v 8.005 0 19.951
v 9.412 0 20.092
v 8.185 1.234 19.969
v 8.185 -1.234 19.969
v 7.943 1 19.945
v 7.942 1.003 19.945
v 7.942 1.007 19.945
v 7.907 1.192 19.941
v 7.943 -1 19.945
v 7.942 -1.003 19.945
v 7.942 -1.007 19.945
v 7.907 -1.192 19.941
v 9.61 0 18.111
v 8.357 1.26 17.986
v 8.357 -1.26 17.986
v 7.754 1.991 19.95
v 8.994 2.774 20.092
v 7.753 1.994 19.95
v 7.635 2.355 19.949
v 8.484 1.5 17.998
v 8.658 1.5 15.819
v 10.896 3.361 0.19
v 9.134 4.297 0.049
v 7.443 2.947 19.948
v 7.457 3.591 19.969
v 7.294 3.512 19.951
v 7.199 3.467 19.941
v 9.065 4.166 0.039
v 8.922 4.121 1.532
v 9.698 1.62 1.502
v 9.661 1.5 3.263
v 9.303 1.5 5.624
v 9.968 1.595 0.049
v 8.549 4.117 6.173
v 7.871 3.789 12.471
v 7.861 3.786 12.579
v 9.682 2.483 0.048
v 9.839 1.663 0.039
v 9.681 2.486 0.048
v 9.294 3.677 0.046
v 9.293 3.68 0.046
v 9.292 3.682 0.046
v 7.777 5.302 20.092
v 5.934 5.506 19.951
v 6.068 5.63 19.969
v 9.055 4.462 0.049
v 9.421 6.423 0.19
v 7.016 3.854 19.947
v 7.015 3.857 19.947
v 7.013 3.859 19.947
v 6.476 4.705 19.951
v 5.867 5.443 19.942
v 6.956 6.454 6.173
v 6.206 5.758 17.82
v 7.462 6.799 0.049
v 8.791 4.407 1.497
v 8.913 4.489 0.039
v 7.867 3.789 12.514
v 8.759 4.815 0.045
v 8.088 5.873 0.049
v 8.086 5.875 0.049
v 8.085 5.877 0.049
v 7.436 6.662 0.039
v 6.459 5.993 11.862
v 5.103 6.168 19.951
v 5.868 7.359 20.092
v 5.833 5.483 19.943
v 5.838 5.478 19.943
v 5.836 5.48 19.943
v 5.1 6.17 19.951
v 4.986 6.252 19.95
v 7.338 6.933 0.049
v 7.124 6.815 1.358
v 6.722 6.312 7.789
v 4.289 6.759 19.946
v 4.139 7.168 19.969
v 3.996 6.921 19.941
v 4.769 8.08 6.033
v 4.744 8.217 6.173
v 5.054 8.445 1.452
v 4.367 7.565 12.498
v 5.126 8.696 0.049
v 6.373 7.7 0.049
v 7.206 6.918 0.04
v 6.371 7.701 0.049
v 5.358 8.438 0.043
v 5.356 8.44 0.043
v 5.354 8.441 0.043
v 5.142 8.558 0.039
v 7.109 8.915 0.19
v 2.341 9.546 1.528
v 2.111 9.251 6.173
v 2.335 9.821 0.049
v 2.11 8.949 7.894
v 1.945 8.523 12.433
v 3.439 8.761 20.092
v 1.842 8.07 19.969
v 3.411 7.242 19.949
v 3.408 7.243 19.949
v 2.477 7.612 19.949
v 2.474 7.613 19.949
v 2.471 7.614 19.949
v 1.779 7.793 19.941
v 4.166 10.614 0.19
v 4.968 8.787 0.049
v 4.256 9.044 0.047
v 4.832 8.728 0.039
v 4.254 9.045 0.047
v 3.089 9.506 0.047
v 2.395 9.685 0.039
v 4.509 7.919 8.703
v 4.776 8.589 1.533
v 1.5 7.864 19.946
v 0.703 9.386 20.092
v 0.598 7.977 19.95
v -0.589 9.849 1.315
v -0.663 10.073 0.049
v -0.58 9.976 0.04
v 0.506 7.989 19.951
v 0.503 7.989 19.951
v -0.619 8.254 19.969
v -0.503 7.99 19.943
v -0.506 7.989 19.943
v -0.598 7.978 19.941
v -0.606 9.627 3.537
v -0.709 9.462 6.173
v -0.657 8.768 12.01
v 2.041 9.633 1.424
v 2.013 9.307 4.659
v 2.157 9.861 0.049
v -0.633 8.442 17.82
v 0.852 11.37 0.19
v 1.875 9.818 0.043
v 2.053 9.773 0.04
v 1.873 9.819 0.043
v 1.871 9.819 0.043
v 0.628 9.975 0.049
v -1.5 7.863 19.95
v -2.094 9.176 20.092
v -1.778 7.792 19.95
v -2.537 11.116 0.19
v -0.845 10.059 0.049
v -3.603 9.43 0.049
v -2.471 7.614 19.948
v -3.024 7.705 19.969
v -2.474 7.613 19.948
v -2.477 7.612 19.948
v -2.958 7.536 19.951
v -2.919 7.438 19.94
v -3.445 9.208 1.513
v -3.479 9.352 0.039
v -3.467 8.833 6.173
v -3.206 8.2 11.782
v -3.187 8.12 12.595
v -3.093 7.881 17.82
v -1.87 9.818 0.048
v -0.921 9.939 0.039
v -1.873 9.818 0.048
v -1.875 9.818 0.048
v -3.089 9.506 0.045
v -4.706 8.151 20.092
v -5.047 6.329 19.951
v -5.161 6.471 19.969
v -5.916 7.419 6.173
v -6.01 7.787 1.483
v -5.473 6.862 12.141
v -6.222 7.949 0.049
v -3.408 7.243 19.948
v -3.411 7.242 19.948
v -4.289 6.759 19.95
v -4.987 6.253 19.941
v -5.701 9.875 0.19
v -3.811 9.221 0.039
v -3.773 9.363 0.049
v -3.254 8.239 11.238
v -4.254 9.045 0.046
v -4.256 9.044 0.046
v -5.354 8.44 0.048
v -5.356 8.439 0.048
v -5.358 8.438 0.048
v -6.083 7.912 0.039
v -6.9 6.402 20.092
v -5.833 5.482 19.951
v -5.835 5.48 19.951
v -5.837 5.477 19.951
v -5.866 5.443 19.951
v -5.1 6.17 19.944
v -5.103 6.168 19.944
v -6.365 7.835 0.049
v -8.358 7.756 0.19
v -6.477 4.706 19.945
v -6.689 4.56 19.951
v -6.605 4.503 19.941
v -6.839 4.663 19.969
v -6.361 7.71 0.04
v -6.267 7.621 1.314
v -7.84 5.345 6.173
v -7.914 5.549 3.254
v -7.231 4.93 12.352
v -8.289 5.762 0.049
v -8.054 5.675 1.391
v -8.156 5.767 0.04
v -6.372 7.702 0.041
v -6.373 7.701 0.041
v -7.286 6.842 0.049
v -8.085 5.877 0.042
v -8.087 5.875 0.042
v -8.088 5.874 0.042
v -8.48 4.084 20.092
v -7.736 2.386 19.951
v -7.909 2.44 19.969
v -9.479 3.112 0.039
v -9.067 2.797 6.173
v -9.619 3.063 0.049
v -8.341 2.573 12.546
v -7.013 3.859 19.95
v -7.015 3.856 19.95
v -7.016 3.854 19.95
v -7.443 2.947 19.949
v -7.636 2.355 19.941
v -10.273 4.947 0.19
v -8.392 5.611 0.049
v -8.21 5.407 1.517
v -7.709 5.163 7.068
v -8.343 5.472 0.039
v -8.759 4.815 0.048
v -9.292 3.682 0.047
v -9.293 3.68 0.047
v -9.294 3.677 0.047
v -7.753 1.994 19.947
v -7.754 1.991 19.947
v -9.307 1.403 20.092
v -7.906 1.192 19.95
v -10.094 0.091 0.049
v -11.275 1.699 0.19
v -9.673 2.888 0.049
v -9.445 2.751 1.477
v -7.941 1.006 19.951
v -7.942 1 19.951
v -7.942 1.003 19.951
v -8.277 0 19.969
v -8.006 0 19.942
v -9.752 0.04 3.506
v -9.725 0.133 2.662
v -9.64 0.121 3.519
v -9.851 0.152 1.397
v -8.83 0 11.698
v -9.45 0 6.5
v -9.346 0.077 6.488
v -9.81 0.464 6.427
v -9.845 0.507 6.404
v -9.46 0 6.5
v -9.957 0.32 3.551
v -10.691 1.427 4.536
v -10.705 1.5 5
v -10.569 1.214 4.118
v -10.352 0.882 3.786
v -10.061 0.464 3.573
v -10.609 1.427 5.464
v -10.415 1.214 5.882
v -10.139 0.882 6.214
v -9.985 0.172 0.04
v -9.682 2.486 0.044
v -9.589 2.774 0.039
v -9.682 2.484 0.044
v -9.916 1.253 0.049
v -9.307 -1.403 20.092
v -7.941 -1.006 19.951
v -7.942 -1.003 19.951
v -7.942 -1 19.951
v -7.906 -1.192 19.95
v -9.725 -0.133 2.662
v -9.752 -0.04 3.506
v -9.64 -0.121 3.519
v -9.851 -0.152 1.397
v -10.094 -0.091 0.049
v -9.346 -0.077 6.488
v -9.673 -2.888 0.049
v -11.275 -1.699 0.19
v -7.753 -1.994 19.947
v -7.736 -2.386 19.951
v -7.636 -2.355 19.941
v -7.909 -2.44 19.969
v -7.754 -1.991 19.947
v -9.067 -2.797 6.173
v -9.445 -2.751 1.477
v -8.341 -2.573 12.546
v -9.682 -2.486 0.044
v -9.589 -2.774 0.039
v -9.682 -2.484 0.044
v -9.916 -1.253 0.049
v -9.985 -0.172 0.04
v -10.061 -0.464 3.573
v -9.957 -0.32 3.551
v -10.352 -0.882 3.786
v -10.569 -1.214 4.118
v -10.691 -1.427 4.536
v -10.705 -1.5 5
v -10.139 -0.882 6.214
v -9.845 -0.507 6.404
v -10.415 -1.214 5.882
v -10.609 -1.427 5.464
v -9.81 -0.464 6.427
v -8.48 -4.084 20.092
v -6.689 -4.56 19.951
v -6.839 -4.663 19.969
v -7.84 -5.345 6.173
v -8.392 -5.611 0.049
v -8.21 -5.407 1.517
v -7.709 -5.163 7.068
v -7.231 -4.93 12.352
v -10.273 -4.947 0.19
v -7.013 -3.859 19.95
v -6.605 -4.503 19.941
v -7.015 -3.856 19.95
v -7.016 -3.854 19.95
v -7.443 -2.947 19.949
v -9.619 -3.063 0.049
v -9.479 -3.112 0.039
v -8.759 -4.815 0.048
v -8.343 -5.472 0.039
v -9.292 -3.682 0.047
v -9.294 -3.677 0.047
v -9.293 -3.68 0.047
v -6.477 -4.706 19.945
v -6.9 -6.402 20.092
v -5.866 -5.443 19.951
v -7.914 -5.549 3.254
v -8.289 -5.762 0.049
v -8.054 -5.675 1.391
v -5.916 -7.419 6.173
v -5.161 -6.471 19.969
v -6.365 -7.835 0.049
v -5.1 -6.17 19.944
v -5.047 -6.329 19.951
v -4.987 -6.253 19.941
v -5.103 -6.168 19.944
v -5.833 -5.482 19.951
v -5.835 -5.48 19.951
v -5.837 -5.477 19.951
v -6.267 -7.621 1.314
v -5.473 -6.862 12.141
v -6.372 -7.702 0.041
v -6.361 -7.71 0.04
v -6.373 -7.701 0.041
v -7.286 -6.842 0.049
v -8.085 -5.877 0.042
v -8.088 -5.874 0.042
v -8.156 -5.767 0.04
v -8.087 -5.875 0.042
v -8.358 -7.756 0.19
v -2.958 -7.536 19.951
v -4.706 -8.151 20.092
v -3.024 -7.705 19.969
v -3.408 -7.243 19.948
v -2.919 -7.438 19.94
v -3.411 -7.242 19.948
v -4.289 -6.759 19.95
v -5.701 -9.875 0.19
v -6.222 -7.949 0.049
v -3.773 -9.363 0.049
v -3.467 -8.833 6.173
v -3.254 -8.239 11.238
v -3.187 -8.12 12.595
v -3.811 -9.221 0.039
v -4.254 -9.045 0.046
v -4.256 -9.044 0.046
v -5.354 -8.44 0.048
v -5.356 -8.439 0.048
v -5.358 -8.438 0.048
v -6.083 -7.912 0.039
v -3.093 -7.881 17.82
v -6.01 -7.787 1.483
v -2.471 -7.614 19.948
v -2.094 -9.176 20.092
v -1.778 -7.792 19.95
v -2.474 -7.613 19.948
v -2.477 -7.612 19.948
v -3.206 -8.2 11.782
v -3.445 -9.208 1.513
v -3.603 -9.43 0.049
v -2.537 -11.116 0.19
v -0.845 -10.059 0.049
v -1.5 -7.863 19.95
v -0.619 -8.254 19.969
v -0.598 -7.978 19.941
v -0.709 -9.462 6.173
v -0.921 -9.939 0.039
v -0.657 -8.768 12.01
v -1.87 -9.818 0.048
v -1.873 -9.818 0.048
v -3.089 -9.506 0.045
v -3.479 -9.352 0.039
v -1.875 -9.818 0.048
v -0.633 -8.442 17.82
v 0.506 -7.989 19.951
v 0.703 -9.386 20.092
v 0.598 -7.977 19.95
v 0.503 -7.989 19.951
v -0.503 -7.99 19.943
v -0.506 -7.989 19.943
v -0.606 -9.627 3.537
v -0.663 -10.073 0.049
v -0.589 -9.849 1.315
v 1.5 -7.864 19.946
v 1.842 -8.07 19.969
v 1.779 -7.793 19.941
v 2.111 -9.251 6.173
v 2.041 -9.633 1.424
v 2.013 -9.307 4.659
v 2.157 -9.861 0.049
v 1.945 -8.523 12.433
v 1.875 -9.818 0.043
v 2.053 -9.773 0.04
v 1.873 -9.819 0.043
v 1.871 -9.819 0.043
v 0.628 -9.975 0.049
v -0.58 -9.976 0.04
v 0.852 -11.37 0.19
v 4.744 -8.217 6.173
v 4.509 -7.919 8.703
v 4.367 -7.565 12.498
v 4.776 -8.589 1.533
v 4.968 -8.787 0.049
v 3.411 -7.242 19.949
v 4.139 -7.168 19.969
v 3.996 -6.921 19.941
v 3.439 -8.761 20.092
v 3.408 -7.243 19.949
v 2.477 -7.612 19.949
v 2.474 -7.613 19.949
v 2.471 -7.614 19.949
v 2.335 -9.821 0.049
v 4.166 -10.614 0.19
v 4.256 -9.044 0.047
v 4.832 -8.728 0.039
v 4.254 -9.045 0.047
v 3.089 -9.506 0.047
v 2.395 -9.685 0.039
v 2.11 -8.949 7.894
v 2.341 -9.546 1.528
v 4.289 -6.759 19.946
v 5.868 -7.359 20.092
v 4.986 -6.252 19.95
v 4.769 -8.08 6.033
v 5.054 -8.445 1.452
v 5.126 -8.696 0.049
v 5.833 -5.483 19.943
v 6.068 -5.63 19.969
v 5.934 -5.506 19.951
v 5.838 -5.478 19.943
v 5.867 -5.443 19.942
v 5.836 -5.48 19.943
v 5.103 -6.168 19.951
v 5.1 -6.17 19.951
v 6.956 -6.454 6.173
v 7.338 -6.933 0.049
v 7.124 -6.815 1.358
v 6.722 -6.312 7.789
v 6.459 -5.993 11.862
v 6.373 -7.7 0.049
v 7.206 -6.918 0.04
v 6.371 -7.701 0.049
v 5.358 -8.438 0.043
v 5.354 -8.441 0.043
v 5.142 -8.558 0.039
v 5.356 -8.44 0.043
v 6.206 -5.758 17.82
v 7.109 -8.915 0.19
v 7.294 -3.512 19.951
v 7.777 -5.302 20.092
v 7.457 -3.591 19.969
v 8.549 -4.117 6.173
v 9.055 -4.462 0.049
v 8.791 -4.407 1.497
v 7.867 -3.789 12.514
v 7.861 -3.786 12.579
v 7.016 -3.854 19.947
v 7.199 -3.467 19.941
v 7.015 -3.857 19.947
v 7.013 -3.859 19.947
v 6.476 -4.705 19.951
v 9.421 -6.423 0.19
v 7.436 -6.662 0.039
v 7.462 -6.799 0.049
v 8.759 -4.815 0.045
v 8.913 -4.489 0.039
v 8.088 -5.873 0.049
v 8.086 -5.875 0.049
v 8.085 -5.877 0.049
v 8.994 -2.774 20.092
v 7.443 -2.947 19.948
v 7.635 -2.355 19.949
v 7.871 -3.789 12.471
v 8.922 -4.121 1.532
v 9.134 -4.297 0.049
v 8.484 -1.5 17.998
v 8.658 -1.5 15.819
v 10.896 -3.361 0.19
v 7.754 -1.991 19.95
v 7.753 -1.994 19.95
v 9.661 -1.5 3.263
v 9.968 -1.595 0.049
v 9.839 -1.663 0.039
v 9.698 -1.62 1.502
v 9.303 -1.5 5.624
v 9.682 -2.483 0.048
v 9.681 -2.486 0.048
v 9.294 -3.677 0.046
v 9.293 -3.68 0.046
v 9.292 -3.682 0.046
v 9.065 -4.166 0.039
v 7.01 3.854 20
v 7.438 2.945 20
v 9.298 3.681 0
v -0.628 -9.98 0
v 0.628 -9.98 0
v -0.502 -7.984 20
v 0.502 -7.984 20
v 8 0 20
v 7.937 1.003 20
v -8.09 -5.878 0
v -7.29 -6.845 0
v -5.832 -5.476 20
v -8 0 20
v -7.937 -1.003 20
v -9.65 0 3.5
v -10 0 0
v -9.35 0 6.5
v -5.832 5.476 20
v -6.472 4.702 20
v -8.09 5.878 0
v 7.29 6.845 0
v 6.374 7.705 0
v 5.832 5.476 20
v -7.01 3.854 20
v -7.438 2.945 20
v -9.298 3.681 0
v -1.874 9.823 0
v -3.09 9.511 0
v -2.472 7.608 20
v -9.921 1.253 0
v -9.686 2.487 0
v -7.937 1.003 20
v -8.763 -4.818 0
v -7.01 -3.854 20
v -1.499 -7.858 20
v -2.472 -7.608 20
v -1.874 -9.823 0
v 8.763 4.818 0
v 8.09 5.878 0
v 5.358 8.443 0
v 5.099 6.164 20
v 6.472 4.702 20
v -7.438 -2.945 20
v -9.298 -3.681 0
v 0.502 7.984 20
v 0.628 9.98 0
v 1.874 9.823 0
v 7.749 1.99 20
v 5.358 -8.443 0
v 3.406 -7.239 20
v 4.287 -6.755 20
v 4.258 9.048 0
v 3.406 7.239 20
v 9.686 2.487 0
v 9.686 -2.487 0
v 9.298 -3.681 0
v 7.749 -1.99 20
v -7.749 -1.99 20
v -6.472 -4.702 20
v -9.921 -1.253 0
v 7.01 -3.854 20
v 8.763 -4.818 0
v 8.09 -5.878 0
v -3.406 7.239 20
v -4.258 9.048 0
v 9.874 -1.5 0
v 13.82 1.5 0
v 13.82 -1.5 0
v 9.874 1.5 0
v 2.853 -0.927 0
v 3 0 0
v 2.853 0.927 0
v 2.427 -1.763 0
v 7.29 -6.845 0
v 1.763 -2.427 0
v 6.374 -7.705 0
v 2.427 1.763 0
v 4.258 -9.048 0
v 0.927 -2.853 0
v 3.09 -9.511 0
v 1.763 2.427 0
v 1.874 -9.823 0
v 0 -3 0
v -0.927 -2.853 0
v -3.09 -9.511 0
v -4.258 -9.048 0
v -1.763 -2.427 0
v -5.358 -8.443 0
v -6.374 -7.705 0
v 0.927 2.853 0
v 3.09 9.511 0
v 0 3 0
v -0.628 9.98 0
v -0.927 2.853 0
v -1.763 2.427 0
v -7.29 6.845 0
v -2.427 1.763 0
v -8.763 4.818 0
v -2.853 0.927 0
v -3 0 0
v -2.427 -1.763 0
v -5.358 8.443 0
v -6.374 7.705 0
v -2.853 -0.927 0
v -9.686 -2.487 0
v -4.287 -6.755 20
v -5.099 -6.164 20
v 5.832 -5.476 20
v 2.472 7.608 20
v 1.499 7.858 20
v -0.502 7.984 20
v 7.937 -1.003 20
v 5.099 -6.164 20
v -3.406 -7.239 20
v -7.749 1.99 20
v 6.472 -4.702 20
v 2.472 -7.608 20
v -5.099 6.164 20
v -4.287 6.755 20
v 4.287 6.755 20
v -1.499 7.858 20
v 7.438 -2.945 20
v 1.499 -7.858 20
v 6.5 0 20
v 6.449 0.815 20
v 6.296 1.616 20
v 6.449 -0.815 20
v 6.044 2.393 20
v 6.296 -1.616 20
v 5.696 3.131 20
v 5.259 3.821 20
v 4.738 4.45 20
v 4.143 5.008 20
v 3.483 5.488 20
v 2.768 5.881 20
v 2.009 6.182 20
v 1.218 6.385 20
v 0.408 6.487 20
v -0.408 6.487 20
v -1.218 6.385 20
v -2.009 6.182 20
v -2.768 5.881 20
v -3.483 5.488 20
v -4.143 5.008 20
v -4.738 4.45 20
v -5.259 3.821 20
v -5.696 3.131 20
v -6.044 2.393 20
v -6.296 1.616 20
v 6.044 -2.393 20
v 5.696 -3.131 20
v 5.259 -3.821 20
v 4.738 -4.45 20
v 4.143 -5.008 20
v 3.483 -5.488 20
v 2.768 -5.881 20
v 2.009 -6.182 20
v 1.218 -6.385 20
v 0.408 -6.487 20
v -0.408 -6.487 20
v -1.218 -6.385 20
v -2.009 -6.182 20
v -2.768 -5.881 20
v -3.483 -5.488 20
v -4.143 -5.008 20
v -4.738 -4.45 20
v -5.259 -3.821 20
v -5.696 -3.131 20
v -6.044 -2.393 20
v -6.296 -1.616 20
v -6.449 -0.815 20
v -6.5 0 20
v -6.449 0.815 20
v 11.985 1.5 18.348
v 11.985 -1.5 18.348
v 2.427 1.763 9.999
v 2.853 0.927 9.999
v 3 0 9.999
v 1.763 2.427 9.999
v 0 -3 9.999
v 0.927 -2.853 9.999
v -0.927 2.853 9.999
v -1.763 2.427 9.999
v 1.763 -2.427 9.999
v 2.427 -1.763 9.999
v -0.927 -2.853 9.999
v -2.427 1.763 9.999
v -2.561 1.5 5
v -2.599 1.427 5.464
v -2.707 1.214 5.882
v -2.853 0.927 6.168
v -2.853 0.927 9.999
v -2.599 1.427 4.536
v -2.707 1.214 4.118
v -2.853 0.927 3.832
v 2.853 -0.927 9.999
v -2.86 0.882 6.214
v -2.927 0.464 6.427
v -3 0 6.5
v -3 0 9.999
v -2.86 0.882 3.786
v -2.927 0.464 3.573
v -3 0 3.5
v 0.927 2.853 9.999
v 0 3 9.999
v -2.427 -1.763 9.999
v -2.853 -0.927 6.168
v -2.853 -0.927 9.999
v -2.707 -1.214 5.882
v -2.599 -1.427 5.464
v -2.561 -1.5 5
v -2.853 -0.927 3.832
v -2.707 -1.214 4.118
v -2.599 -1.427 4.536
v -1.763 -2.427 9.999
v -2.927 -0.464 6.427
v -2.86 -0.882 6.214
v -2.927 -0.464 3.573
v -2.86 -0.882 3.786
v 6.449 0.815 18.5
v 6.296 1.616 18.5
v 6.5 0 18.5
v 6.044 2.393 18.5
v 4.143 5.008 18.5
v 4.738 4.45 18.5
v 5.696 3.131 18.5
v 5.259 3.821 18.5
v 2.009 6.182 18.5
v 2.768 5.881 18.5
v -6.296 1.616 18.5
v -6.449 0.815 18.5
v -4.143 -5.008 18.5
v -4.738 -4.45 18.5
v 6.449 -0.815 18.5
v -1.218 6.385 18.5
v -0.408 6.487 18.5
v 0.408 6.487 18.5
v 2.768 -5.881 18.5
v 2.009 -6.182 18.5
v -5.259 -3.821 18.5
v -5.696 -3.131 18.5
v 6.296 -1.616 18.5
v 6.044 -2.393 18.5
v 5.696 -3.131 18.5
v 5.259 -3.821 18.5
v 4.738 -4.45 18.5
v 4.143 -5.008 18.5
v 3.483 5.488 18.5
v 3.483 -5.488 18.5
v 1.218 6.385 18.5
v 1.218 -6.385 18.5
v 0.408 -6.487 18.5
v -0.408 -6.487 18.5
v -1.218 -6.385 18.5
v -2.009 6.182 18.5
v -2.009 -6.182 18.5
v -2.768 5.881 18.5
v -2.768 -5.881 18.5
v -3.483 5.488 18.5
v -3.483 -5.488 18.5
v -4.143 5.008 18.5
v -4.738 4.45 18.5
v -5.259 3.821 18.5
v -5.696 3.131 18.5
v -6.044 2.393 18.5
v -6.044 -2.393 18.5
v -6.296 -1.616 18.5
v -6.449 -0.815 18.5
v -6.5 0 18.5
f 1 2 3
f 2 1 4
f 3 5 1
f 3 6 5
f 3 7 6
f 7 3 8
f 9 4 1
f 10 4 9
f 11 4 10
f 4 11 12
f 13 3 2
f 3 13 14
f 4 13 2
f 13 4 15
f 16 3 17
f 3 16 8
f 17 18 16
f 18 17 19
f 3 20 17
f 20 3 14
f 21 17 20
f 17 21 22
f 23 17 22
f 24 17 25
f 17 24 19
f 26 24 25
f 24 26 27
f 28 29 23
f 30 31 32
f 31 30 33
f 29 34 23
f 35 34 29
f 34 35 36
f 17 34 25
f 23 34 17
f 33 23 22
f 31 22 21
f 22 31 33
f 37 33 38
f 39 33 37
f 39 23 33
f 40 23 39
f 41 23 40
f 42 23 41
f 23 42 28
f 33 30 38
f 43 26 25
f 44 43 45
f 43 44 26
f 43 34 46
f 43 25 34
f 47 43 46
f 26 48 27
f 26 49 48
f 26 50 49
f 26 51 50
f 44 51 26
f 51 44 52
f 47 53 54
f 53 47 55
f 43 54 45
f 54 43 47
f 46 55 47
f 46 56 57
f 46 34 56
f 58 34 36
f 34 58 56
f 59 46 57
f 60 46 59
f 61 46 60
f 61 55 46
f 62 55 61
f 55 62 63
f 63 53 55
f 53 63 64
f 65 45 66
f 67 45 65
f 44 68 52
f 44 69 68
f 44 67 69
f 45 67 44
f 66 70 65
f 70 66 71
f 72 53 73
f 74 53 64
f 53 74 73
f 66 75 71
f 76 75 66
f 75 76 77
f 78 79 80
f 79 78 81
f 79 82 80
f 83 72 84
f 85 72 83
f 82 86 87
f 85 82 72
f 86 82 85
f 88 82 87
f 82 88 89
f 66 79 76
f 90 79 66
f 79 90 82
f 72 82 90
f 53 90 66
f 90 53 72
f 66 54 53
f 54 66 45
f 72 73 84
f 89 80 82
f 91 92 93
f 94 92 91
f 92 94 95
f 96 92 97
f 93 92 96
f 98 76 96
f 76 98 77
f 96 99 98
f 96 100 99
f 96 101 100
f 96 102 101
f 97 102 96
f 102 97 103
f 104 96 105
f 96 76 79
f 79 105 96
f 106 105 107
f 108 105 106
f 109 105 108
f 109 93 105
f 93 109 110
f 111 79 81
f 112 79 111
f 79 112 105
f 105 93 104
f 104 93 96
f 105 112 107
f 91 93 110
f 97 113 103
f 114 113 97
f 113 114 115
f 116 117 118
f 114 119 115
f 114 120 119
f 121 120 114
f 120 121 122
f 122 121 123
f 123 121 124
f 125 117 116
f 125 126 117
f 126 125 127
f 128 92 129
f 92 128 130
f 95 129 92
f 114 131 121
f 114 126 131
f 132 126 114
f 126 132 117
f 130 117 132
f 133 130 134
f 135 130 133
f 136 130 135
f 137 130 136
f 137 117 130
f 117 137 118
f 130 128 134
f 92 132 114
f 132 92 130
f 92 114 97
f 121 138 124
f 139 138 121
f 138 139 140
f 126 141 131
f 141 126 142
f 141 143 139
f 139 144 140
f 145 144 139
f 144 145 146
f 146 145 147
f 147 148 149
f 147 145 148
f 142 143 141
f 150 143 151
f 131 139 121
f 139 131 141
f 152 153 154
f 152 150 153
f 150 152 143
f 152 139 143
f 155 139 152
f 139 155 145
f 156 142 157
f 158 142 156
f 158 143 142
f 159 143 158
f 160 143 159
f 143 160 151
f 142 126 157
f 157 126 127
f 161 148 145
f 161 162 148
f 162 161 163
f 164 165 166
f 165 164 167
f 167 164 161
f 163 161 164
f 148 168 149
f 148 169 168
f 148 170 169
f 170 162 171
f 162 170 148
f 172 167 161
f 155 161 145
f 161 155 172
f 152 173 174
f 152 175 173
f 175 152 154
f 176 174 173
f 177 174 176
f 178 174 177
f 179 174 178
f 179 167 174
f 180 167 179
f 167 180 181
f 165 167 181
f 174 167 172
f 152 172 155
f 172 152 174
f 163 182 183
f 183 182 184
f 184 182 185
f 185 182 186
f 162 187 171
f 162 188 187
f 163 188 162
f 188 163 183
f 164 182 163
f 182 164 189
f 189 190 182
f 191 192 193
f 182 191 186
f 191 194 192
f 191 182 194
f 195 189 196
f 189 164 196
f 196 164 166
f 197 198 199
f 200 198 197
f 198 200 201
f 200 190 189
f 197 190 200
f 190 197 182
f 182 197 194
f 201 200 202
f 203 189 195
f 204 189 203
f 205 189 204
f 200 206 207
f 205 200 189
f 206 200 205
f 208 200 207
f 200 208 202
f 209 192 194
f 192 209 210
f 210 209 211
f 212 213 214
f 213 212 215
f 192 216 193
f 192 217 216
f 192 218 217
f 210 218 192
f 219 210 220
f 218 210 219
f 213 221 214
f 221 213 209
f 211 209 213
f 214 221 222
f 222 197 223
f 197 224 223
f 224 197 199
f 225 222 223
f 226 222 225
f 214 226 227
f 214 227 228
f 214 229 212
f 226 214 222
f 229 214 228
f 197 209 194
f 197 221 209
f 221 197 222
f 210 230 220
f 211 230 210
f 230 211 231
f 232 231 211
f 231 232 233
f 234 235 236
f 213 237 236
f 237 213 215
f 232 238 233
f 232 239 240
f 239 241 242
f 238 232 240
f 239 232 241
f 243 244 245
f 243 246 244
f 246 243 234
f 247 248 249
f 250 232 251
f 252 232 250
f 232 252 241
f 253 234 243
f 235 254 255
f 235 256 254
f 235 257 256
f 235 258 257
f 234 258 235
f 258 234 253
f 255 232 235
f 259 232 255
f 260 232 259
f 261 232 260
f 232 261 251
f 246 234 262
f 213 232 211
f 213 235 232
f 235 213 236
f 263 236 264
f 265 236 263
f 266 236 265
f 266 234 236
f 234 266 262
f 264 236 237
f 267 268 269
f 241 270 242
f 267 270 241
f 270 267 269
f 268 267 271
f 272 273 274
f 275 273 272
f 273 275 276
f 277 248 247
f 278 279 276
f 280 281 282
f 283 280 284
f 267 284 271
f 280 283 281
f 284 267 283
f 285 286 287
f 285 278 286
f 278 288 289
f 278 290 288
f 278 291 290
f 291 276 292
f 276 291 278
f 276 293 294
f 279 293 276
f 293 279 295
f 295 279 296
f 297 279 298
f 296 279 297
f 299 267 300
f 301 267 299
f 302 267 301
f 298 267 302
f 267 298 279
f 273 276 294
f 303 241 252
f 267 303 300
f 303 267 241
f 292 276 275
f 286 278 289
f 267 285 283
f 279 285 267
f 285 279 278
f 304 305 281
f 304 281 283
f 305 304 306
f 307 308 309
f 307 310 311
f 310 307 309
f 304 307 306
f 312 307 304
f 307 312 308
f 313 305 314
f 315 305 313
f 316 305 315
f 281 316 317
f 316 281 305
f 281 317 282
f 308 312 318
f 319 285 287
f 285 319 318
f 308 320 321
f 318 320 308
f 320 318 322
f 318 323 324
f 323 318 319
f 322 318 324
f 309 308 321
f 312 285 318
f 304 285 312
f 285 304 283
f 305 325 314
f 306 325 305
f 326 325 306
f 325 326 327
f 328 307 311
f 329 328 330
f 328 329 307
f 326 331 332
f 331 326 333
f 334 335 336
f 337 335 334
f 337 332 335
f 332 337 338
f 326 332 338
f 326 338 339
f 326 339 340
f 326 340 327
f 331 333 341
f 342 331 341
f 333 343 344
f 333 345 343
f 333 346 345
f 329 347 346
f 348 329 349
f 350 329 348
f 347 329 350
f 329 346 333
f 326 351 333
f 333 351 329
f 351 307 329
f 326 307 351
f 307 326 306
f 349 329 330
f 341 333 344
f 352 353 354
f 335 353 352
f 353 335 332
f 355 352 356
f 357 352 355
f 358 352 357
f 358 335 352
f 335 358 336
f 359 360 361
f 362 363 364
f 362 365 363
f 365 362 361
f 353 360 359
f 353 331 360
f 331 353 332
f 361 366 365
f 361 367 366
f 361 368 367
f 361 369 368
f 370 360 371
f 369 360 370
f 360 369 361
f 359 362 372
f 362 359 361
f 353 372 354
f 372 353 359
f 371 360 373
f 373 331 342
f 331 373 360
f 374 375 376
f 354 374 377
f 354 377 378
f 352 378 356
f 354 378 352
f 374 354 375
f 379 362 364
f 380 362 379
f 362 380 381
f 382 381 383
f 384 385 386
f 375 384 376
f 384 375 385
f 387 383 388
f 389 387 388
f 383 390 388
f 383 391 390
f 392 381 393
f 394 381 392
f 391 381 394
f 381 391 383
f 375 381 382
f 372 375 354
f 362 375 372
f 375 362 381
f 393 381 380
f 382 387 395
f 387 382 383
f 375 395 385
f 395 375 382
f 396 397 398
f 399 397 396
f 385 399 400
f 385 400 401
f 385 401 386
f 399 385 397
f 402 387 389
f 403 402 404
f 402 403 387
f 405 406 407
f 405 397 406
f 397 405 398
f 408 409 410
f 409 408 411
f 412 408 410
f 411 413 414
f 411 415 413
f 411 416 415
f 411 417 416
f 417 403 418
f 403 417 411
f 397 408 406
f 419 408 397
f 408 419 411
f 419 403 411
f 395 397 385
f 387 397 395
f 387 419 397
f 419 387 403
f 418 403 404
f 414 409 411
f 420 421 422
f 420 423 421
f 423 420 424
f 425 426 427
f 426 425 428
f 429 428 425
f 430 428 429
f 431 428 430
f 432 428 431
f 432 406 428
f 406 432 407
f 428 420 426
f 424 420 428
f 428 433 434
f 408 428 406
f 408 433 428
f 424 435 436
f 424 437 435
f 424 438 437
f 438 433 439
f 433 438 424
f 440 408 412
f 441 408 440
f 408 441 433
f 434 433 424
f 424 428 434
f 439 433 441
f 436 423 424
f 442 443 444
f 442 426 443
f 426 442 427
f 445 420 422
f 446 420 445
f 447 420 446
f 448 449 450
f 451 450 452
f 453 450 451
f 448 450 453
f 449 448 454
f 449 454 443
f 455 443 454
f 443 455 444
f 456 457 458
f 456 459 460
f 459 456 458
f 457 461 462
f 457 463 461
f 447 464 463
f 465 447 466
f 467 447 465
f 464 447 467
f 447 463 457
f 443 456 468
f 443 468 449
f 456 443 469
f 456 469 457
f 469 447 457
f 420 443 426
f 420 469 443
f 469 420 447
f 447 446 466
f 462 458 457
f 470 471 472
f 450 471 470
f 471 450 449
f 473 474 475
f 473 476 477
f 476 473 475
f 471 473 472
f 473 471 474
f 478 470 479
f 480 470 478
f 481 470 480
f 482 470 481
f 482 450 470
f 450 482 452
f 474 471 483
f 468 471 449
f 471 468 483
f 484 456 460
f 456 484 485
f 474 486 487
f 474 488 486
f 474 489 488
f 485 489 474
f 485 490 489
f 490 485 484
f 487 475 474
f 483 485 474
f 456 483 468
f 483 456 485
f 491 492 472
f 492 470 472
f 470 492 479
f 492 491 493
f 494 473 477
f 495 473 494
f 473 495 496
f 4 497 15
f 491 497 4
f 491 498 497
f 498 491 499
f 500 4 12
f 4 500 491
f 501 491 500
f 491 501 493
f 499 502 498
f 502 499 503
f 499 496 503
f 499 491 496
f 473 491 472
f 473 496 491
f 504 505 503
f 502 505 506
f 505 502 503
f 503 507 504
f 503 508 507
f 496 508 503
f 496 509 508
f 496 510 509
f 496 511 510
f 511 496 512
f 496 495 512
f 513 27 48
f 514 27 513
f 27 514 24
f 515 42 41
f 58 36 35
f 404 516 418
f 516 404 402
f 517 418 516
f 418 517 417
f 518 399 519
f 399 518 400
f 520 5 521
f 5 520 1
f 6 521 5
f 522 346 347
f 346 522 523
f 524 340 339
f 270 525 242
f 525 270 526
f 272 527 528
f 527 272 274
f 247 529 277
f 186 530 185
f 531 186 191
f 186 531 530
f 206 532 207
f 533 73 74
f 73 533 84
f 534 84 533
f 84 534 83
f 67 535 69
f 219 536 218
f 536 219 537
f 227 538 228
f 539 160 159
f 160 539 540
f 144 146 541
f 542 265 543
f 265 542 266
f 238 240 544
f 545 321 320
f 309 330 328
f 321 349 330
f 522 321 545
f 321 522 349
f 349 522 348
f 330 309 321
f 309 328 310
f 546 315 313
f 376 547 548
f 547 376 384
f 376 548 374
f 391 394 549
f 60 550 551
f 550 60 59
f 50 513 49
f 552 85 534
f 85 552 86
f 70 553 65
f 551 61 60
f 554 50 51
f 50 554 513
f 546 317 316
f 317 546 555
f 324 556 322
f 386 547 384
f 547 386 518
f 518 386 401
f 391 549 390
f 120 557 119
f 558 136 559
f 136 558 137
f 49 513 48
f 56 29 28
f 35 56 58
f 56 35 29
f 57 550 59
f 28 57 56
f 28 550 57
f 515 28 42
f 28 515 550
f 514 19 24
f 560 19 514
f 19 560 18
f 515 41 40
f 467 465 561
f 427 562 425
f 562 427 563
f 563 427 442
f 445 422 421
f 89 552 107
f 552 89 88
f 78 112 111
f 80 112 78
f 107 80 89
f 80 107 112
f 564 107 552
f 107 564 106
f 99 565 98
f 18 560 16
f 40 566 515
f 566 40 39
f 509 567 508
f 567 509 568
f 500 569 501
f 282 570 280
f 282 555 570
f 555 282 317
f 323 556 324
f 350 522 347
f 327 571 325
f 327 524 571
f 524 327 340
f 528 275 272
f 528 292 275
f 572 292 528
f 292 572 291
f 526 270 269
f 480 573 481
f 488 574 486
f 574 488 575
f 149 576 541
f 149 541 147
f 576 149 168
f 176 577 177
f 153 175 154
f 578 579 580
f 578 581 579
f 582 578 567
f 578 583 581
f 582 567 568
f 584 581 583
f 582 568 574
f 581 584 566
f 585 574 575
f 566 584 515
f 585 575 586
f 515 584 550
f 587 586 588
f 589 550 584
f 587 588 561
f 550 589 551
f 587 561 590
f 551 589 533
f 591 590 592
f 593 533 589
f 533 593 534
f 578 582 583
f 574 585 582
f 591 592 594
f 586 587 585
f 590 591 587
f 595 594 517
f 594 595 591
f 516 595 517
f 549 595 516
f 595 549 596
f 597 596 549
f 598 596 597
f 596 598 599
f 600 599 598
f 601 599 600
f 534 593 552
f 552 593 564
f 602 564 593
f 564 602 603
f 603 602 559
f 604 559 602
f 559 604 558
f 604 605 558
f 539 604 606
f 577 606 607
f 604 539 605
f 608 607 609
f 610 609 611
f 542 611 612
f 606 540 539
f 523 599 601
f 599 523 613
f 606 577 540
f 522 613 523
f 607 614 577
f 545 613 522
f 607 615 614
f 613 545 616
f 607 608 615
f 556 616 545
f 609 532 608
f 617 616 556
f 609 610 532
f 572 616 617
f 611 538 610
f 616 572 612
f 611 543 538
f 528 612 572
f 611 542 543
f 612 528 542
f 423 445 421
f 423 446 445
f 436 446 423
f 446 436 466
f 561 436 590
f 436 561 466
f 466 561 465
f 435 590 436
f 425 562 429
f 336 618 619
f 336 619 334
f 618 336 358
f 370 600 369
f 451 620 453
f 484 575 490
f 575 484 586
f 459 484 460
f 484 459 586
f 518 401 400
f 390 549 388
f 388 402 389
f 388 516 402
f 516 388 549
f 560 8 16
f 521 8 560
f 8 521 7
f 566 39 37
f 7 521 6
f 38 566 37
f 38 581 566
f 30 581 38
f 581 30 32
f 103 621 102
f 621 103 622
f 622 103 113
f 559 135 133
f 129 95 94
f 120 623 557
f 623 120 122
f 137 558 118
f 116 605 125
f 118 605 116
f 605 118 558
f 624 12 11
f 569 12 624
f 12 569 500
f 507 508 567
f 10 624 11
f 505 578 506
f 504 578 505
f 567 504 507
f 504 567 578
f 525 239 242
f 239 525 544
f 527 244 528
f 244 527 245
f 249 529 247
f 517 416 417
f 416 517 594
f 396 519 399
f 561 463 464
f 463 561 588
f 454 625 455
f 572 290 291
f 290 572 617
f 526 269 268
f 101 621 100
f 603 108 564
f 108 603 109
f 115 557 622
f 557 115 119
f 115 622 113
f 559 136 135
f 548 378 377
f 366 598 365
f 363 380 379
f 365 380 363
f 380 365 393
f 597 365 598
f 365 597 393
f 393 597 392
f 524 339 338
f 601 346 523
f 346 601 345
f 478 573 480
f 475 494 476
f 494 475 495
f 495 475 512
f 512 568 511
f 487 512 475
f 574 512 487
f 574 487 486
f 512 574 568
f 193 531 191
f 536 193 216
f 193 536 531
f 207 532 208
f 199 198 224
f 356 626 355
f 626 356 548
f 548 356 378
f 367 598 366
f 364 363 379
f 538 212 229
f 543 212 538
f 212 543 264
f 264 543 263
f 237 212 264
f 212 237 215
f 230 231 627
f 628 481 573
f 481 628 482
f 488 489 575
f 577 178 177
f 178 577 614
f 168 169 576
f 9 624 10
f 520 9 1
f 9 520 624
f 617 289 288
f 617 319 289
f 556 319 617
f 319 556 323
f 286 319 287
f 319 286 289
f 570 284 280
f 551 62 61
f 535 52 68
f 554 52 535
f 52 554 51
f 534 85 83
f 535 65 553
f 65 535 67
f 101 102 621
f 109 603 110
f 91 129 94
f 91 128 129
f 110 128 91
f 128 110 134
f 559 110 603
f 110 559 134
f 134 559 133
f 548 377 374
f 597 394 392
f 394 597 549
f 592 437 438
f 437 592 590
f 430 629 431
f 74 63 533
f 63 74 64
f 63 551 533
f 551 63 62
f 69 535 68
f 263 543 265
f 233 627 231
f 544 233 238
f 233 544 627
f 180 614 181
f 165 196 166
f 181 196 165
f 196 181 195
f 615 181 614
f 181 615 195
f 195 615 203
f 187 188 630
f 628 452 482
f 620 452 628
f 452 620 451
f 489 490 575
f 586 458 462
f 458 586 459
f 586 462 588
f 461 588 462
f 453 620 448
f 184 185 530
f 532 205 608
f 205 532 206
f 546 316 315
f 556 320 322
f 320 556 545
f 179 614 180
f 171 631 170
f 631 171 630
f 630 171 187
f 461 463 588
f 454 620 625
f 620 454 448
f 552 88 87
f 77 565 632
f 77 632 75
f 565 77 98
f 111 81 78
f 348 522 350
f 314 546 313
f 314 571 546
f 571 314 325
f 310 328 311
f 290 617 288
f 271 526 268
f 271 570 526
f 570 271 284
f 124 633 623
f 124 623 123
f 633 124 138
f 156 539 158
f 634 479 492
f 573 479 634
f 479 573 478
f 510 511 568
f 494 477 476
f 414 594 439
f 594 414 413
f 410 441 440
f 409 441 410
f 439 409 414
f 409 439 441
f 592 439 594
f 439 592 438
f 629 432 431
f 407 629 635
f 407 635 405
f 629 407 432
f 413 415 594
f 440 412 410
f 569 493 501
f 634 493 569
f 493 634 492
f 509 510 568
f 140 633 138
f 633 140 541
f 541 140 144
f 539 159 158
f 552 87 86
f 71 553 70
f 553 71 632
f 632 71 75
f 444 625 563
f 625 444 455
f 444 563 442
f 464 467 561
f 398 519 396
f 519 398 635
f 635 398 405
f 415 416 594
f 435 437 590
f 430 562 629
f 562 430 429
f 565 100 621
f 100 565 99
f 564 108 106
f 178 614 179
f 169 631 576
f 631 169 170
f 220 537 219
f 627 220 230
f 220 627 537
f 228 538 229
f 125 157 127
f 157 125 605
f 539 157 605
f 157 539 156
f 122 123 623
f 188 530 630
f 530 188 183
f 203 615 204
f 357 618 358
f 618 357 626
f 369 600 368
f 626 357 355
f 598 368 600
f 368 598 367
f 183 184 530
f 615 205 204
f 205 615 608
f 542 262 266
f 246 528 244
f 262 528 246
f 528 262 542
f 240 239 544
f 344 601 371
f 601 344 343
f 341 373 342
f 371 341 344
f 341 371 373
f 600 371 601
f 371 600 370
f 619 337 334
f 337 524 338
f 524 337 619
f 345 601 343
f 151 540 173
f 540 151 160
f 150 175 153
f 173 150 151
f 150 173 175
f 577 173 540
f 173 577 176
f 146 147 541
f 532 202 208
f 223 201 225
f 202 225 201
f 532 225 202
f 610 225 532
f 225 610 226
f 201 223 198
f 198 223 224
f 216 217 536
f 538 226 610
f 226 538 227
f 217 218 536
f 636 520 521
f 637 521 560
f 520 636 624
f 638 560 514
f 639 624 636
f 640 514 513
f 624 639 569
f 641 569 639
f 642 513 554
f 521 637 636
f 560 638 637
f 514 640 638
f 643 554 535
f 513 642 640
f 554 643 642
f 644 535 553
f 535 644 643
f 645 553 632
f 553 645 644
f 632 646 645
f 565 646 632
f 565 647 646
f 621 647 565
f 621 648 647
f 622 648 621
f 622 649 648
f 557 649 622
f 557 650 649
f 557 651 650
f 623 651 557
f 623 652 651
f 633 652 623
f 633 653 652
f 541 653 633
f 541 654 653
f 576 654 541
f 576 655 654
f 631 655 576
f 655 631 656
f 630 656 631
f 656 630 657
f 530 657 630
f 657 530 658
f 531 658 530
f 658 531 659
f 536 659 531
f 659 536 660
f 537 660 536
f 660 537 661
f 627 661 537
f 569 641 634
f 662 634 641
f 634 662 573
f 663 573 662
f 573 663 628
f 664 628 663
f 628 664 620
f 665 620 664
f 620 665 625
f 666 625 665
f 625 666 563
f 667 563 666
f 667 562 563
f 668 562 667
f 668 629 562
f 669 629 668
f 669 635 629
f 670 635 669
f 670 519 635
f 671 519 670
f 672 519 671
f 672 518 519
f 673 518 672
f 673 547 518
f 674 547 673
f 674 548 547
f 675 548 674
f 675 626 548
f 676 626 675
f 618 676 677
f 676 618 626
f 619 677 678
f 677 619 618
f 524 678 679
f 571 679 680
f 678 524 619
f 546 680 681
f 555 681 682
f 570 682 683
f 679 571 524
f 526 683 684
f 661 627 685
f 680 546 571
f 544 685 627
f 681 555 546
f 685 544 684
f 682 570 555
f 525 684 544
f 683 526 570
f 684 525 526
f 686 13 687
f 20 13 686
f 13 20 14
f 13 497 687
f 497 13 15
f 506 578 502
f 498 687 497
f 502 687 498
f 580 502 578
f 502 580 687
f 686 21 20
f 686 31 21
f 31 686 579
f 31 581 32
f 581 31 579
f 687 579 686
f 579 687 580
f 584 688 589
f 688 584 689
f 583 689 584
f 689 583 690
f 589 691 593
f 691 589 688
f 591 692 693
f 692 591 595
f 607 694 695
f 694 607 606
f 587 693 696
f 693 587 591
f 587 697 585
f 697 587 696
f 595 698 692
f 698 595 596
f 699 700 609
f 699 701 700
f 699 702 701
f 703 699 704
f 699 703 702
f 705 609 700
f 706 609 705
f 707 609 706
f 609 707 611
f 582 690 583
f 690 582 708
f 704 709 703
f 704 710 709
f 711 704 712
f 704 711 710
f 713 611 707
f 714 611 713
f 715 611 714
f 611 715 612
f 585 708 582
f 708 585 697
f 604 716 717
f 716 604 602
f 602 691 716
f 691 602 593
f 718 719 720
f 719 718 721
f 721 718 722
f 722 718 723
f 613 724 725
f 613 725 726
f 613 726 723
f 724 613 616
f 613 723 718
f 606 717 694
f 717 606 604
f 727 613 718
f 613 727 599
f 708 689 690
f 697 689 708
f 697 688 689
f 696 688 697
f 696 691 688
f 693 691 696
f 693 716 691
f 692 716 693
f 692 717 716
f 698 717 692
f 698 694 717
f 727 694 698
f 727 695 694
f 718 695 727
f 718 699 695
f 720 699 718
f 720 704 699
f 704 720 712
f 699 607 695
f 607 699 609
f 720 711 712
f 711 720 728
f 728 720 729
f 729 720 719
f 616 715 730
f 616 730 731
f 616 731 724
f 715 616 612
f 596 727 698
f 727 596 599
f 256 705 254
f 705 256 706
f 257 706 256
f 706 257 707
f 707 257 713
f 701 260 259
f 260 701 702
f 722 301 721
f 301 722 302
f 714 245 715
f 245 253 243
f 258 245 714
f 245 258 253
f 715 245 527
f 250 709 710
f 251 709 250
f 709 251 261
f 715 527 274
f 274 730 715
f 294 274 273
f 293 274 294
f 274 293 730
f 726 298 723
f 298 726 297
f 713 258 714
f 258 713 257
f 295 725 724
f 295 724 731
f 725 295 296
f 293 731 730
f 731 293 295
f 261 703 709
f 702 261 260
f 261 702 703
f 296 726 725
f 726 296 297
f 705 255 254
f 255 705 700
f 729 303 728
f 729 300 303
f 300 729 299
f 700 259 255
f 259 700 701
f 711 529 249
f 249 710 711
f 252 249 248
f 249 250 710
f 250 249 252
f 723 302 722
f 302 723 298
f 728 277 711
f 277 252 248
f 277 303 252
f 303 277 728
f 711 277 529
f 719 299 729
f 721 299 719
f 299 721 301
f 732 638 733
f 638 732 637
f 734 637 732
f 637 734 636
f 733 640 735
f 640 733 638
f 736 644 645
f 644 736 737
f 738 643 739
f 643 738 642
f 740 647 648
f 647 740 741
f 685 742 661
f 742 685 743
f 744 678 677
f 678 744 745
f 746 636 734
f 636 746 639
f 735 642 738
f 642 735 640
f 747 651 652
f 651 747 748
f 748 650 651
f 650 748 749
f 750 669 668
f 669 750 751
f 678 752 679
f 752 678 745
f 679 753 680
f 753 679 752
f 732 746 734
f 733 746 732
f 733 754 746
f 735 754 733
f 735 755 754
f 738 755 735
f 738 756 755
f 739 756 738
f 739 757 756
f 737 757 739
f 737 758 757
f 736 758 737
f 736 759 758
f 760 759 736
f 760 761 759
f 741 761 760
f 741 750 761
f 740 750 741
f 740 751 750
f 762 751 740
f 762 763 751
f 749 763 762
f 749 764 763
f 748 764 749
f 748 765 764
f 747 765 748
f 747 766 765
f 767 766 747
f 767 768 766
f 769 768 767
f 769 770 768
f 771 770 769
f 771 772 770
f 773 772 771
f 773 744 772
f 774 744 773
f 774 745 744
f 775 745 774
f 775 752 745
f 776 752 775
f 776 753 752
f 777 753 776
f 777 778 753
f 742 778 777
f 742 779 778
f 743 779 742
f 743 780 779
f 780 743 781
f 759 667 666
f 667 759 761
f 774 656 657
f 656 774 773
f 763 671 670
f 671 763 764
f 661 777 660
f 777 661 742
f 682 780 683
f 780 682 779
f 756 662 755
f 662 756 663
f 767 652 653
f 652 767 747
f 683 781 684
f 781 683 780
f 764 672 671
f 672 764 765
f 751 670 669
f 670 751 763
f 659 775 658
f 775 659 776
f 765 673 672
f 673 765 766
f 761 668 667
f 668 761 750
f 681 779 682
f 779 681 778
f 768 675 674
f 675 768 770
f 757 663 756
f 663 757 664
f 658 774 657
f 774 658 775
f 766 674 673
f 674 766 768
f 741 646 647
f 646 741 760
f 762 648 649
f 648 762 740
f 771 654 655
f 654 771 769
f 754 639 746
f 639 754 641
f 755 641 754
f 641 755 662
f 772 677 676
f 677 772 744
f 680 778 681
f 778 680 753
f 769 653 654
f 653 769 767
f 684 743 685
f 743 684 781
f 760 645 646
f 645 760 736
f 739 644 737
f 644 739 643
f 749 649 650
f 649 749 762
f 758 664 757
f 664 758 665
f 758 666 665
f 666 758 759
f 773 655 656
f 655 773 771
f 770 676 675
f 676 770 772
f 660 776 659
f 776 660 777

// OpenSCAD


//////////////////////////
// Customizable settings
//////////////////////////


// Diameter of the hole on the bottom (in mm).
HoleDiameter = 6;

// Depth of the hole in the bottom (in mm).  If you want the hole to go all the way through then set this to a number larger than the total height of the object.
HoleDepth = 10;

// If you want a D-shaped hole, set this to the thickness of the flat side (in mm).  Larger values for the flat make the hole smaller.
HoleFlatThickness = 0;

// Height (in mm).  If dome cap is selected, it is not included in height.  The shaft length is also not counted.
KnobHeight = 20;

// Diameter of base of round part of knob (in mm).  (Knurled ridges are not included in this measurement.)
KnobDiameter = 20;

// Shape of top of knob.  "Recessed" type can be painted.
CapType = 1;	// [0:Flat, 1:Recessed, 2:Dome]

// Do you want a large timer-knob style pointer?
TimerKnob=0;	// [0:No, 1:Yes]

// Would you like a divot on the top to indicate direction?
Pointer1 = 0;	// [0:No, 1:Yes]

// Would you like a line (pointer) on the front to indicate direction?
Pointer2 = 1;	// [0:No, 1:Yes]

// Do you want finger ridges around the knob?
Knurled = 1;	// [0:No, 1:Yes]

// 0 = A cylindrical knob, any other value will taper the knob.
TaperPercentage = 20;		// [0:0%, 10:10%, 20:20%, 30:30%, 40:40%, 50:50%]

// Width of "dial" ring (in mm).  Set to zero if you don't want the ring.
RingWidth = 0;

// The number of markings on the dial.  Set to zero if you don't want markings.  (RingWidth must be non-zero.)
RingMarkings = 10;

// diameter of the hole for the setscrew (in mm).  If you don't need a hole, set this to zero.
ScrewHoleDiameter = 3;

// Length of the shaft on the bottom of the knob (in mm).  If you don't want a shaft, set this value to zero.
ShaftLength = 0;

// Diameter of the shaft on the bottom of the knob (in mm).  (ShaftLength must be non-zero.)
ShaftDiameter = 10;

// Would you like a notch in the shaft?  It can be used for a press-on type knob (rather than using a setscrew).  (ShaftLength must be non-zero.)
NotchedShaft = 0;	// [0:No, 1:Yes]



//////////////////////////
//Advanced settings
//////////////////////////

RingThickness = 5*1;
DivotDepth = 1.5*1;
MarkingWidth = 1.5*1;
DistanceBetweenKnurls = 3*1;
TimerKnobConst = 1.8*1;



//////////////////////////
//Calculations
//////////////////////////

PI=3.14159265*1;
KnobMajorRadius = KnobDiameter/2;
KnobMinorRadius = KnobDiameter/2 * (1 - TaperPercentage/100);
KnobRadius = KnobMinorRadius + (KnobMajorRadius-KnobMinorRadius)/2;
KnobCircumference = PI*KnobDiameter;
Knurls = round(KnobCircumference/DistanceBetweenKnurls);
Divot=CapType;

TaperAngle=asin(KnobHeight / (sqrt(pow(KnobHeight, 2) +
		pow(KnobMajorRadius-KnobMinorRadius,2)))) - 90;

DivotRadius = KnobMinorRadius*.4;


union()
{
translate([0, 0, (ShaftLength==0)? 0 : ShaftLength-0.001])
difference()
{
union()
{
	// Primary knob cylinder
	cylinder(h=KnobHeight, r1=KnobMajorRadius, r2=KnobMinorRadius,
			$fn=50);
	
	if (Knurled)
		for (i=[0 : Knurls-1])
			rotate([0, 0, i * (360/Knurls)])
				translate([KnobRadius, 0, KnobHeight/2])
					rotate([0, TaperAngle, 0]) rotate([0, 0, 45])
						cube([2, 2, KnobHeight+.001], center=true);

 	if (RingMarkings>0)
		for (i=[0 : RingMarkings-1])
			rotate([0, 0, i * (360/RingMarkings)])
				translate([KnobMajorRadius + RingWidth/2, 0, 1])
					cube([RingWidth*.5, MarkingWidth, 2], center=true);		
	
	if (Pointer2==1)
		translate([KnobRadius, 0, KnobHeight/2-2])
			rotate([0, TaperAngle, 0])
				cube([8, 3, KnobHeight], center=true);		

	if (RingWidth>0)
		translate([0, 0, RingThickness/2])
			cylinder(r1=KnobMajorRadius + RingWidth, r2=KnobMinorRadius,
					h=RingThickness, $fn=50, center=true);

	if (Divot==2)
		translate([0, 0, KnobHeight])
			difference()
			{
				scale([1, 1, 0.5])
					sphere(r=KnobMinorRadius, $fn=50, center=true);

				translate([0, 0, 0-(KnobMinorRadius+.001)])
					cube([KnobMinorRadius*2.5, KnobMinorRadius*2.5,
							KnobMinorRadius*2], center=true);
			}

	if (TimerKnob==1) intersection()
		{
			translate([0, 0, 0-(KnobDiameter*TimerKnobConst) + KnobHeight])
			sphere(r=KnobDiameter*TimerKnobConst, $fn=50, center=true);		
	
			translate([0-(KnobDiameter*TimerKnobConst)*0.1, 0,
					KnobHeight/2])
				scale([1, 0.5, 1])
					cylinder(h=KnobHeight, r=(KnobDiameter*TimerKnobConst) *
							0.8, $fn=3, center=true);
		}
}

// Pointer1: Offset hemispherical divot
if (Pointer1==1)
	translate([KnobMinorRadius*.55, 0, KnobHeight + DivotRadius*.6])
		sphere(r=DivotRadius, $fn=40);

// Divot1: Centered cylynrical divot
if (Divot==1)
	translate([0, 0, KnobHeight])
		cylinder(h=DivotDepth*2, r=KnobMinorRadius-1.5, $fn=50,
				center=true);

if (ShaftLength==0)
{
	// Hole for shaft
	translate([0, 0, HoleDepth/2 - 0.001])
		difference()
		{
			cylinder(r=HoleDiameter/2, h=HoleDepth, $fn=20,
					center=true);
	
			// Flat for D-shaped hole
			translate([(0-HoleDiameter)+HoleFlatThickness, 0, 0])
				cube([HoleDiameter, HoleDiameter, HoleDepth+.001],
						center=true);
		}
	
	// Hole for setscrew
	if (ScrewHoleDiameter>0)
		translate([0 - (KnobMajorRadius+RingWidth+1)/2, 0,
				HoleDepth/2])
			rotate([0, 90, 0])
			cylinder(h=(KnobMajorRadius+RingWidth+1),
					r=ScrewHoleDiameter/2, $fn=20, center=true);
}

// Make sure bottom ends at z=0
translate([0, 0, -10])
	cube([(KnobMajorRadius+RingWidth) * 3,
			(KnobMajorRadius+RingWidth) * 3, 20], center=true);
}

if (ShaftLength>0)
	difference()
	{
		translate([0, 0, ShaftLength/2])
			cylinder(h=ShaftLength, r=ShaftDiameter/2, $fn=20,
					center=true);

		if (NotchedShaft==1)
		{
			cube([HoleDiameter/2, ShaftDiameter*2, ShaftLength],
					center=true);
		}

		// Hole for shaft
		translate([0, 0, HoleDepth/2 - 0.001])
			difference()
			{
				cylinder(r=HoleDiameter/2, h=HoleDepth, $fn=20,
						center=true);
		
				// Flat for D-shaped hole
				translate([(0-HoleDiameter)+HoleFlatThickness, 0, 0])
					cube([HoleDiameter, HoleDiameter, HoleDepth+.001],
							center=true);
			}
		
		// Hole for setscrew
		if (ScrewHoleDiameter>0)
			translate([0 - (KnobMajorRadius+RingWidth+1)/2, 0,
					HoleDepth/2])
				rotate([0, 90, 0])
				cylinder(h=(KnobMajorRadius+RingWidth+1),
						r=ScrewHoleDiameter/2, $fn=20, center=true);
	}
}


